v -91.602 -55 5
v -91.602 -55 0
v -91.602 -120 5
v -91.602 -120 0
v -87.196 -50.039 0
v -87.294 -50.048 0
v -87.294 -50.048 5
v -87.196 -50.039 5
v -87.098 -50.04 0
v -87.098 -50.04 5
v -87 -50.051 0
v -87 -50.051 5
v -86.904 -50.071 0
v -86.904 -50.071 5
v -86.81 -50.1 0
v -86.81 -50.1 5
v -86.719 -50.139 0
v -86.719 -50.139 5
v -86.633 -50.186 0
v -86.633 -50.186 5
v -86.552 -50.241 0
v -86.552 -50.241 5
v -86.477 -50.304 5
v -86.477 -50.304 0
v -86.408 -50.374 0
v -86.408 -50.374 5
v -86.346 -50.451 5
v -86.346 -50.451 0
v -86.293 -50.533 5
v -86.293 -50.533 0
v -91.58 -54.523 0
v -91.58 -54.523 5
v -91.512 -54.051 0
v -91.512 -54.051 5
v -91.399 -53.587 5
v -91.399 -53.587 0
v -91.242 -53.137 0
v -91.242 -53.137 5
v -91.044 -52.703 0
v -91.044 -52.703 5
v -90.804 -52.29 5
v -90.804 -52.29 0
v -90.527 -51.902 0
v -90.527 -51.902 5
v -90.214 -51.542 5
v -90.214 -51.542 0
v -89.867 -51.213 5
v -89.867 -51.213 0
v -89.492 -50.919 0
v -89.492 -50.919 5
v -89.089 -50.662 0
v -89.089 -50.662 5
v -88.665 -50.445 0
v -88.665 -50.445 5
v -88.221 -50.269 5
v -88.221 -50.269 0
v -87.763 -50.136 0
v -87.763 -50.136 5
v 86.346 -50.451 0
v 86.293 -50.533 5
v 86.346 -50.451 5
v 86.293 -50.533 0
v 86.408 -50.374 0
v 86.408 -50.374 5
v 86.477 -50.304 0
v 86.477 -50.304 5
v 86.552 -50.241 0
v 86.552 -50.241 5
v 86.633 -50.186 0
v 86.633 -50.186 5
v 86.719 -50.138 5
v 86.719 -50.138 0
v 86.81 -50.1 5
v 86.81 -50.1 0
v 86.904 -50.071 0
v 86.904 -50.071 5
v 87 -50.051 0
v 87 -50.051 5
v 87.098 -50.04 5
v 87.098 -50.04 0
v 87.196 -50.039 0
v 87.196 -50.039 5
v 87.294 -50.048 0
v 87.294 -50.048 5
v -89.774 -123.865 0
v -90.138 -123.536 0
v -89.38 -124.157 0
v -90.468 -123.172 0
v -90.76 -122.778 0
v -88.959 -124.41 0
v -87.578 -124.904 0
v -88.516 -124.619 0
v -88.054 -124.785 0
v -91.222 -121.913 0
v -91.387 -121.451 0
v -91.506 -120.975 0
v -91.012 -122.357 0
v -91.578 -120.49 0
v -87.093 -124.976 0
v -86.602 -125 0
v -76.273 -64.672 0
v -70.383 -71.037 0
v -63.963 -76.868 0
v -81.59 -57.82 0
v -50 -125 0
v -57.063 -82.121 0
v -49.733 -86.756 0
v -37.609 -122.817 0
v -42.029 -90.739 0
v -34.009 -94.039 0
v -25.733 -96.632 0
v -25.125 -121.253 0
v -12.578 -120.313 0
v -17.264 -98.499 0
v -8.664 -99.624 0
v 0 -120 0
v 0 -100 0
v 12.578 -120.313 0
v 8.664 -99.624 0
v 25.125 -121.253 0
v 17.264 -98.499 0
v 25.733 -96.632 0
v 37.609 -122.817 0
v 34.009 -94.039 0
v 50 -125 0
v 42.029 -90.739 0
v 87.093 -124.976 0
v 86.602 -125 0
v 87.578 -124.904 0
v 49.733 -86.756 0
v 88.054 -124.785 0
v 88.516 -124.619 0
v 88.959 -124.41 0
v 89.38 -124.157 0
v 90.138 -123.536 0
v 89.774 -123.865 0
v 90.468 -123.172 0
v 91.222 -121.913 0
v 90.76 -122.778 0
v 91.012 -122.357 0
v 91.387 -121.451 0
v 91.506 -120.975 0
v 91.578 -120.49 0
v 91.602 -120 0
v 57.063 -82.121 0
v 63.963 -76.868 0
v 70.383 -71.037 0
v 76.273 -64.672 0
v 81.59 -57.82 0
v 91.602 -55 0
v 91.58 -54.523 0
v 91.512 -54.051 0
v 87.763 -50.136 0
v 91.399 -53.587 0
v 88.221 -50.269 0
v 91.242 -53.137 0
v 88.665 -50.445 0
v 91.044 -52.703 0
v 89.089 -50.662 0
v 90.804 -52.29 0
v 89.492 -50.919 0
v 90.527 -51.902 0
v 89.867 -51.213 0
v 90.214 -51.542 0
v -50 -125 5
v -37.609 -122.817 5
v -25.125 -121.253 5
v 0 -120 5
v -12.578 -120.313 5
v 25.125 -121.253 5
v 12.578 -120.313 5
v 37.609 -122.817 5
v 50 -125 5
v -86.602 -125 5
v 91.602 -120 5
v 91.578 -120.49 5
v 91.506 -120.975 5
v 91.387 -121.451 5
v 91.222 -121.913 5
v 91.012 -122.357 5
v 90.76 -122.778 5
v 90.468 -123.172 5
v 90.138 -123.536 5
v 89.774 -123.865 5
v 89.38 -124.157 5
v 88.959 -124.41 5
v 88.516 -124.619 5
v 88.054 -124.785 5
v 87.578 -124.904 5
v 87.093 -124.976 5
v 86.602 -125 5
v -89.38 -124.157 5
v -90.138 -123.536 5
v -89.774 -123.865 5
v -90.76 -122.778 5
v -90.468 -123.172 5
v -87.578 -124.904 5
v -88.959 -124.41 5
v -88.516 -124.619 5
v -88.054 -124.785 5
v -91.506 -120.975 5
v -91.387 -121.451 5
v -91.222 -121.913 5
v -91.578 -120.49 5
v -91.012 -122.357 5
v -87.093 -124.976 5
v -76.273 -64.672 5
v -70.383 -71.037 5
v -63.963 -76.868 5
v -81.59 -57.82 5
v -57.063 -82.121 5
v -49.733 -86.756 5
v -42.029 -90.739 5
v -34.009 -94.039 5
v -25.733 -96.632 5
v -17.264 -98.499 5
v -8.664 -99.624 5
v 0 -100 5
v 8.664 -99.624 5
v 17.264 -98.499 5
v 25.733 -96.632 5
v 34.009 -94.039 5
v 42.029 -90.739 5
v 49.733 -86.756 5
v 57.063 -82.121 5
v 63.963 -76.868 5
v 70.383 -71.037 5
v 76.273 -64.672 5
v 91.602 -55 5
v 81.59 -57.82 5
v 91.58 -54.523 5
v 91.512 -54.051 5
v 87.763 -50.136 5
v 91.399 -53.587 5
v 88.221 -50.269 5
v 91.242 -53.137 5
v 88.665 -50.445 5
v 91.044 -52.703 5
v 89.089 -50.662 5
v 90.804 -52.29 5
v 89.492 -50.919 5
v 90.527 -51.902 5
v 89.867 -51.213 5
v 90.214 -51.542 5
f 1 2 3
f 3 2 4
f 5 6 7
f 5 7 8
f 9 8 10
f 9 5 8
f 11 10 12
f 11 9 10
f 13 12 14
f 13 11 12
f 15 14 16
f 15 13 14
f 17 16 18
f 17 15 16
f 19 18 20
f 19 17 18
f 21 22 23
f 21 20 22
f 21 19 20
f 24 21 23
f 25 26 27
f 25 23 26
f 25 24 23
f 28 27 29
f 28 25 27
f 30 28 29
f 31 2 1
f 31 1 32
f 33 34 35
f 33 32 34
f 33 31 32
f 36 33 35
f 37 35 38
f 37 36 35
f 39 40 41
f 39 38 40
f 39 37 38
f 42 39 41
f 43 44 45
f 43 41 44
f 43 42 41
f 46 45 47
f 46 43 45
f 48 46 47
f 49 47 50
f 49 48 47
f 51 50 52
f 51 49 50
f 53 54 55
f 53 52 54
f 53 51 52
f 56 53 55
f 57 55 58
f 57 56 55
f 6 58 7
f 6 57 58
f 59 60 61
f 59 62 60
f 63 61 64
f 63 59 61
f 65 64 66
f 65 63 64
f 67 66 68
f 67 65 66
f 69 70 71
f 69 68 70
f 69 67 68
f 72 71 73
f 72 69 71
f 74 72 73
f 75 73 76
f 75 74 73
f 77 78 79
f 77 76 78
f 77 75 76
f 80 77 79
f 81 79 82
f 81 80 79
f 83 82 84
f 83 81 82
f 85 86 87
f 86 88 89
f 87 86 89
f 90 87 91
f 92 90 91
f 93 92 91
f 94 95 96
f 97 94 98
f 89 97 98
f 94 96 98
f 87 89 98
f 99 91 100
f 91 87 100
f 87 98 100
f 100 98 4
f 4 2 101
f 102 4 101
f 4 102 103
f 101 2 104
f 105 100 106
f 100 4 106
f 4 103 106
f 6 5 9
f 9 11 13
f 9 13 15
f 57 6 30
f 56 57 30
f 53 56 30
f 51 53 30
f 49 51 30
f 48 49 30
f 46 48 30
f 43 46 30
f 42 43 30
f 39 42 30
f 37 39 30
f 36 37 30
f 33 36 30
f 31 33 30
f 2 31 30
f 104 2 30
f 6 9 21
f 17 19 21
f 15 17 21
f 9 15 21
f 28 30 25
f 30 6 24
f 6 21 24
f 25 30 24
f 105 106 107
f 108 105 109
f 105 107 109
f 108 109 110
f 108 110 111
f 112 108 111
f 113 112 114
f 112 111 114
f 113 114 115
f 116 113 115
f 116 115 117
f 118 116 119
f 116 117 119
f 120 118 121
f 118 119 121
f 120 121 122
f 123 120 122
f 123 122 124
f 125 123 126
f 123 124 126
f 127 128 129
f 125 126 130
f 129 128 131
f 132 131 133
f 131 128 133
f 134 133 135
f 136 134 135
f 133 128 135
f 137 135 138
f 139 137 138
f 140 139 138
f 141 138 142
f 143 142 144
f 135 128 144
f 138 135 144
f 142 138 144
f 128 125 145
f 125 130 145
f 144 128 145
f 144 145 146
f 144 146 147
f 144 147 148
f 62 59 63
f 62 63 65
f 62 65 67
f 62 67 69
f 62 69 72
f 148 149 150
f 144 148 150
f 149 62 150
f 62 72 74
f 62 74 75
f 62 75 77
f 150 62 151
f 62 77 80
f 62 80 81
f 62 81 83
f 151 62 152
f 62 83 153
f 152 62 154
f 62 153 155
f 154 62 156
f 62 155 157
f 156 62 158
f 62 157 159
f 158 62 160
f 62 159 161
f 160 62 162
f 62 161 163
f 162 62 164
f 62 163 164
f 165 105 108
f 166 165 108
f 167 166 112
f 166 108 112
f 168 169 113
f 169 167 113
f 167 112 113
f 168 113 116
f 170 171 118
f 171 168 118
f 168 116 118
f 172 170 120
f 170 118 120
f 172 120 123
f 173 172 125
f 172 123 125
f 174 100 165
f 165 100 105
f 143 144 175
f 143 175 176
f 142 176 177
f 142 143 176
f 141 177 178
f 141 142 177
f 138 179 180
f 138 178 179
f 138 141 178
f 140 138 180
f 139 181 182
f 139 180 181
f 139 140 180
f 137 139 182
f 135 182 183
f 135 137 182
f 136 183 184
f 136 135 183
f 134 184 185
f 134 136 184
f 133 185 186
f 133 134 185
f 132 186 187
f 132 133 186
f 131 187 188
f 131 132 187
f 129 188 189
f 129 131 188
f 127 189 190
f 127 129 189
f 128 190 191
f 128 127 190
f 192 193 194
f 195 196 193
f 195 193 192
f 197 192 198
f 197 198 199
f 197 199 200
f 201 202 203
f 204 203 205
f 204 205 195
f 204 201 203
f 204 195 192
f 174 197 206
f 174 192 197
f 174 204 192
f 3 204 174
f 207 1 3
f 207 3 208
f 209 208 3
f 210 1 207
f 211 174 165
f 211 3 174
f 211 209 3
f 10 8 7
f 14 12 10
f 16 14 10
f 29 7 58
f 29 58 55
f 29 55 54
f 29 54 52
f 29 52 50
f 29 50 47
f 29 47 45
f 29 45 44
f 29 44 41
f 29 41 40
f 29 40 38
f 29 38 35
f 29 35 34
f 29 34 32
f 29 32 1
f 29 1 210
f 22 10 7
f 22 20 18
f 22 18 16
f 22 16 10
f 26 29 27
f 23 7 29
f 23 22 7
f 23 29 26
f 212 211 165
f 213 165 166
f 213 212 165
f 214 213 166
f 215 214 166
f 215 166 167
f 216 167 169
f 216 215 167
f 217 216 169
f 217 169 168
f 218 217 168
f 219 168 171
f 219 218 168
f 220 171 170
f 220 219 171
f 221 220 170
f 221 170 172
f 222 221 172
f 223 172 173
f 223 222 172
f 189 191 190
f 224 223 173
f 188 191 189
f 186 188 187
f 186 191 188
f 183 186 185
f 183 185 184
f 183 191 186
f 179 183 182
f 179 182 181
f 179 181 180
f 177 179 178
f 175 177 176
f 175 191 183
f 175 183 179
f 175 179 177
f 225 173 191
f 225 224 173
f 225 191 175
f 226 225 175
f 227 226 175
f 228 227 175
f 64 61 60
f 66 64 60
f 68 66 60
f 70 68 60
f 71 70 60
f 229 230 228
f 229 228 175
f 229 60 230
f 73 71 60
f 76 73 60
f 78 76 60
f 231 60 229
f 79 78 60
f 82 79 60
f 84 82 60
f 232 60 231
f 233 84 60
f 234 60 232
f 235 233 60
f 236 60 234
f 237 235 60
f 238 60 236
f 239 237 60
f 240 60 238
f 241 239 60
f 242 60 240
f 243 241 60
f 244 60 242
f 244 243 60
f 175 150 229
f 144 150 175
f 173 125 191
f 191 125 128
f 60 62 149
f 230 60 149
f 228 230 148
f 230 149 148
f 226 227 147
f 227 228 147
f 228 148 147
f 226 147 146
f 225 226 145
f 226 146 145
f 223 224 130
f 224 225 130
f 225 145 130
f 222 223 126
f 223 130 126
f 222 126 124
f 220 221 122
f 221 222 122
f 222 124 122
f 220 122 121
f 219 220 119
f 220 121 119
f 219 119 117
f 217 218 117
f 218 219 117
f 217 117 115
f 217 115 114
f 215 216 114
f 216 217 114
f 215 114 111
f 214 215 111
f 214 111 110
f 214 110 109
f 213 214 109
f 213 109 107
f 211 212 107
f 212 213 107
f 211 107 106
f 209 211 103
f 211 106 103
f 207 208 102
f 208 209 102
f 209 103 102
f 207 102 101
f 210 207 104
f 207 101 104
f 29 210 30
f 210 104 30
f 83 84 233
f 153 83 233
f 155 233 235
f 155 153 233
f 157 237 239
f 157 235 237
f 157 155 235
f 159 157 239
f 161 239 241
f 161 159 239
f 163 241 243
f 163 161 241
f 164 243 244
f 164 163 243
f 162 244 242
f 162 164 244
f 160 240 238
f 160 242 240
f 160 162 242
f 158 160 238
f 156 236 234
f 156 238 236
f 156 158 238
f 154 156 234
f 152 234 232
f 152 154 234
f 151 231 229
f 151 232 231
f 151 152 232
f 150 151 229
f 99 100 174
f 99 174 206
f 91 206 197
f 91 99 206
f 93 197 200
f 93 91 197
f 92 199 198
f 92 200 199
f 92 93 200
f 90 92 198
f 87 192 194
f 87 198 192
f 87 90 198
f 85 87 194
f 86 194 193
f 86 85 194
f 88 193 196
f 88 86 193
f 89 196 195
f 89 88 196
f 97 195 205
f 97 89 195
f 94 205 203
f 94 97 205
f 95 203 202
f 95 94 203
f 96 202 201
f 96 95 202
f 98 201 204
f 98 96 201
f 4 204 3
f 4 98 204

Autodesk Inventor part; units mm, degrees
ref_plane "YZ Plane" through (0, 0, 0) normal (1, 0, 0) x (0, 1, 0)
ref_plane "XZ Plane" through (0, 0, 0) normal (0, 1, 0) x (-1, 0, 0)
ref_plane "XY Plane" through (0, 0, 0) normal (0, 0, 1) x (1, 0, 0)
sketch "Skizze1" plane through (0, 0, 0) normal (0, 0, 1) x (1, 0, 0)
  circle A0 centre (0, 0) radius 100 construction
  arc A1 (-86.2926, -50.5331) -> (86.2926, -50.5331) centre (0, 0) ccw
  line L0 (-86.6025, -50) -> (0, 0) construction
  line L1 (0, 0) -> (86.6025, -50) construction
  line L2 (0, -467) -> (0, 194.5) construction
  line L3 (-86.6025, -125) -> (86.6025, -125)
  line L4 (-86.6025, -50) -> (-86.6025, -50)
  line L5 (-91.6025, -55) -> (-91.6025, -120)
  line L6 (86.6025, -50) -> (86.6025, -50)
  line L7 (91.6025, -55) -> (91.6025, -120)
  arc A2 (-87.2937, -50.048) -> (-91.6025, -55) centre (-86.6025, -55) ccw
  arc A3 (91.6025, -55) -> (87.2937, -50.048) centre (86.6025, -55) ccw
  arc A4 (-86.2926, -50.5331) -> (-87.2937, -50.048) centre (-87.1555, -51.0384) ccw
  arc A5 (87.2937, -50.048) -> (86.2926, -50.5331) centre (87.1555, -51.0384) ccw
  arc A6 (-91.6025, -120) -> (-86.6025, -125) centre (-86.6025, -120) ccw
  arc A7 (86.6025, -125) -> (91.6025, -120) centre (86.6025, -120) ccw
  arc A8 (50, -125) -> (-50, -125) centre (0, -372.5) ccw
  point P0 (0, -100)
  point P1 (-91.6025, -50)
  point P2 (0, -125)
  point P3 (0, -120)
  dimension "d0" = 200
  dimension "d1" = 60
  dimension "d2" = 5
  dimension "d3" = 25
  dimension "d4" = 5
  dimension "d5" = 1
  dimension "d6" = 5
  dimension "d7" = 50
  dimension "d8" = 50
  dimension "d9" = 5
extrude "Extrusion1" add sketch "Skizze1" along normal blind 5 contours A1 A5 A3 L7 A7 L3 A8 A6 L5 A2 A4
properties part number "Montage_Fuss"
